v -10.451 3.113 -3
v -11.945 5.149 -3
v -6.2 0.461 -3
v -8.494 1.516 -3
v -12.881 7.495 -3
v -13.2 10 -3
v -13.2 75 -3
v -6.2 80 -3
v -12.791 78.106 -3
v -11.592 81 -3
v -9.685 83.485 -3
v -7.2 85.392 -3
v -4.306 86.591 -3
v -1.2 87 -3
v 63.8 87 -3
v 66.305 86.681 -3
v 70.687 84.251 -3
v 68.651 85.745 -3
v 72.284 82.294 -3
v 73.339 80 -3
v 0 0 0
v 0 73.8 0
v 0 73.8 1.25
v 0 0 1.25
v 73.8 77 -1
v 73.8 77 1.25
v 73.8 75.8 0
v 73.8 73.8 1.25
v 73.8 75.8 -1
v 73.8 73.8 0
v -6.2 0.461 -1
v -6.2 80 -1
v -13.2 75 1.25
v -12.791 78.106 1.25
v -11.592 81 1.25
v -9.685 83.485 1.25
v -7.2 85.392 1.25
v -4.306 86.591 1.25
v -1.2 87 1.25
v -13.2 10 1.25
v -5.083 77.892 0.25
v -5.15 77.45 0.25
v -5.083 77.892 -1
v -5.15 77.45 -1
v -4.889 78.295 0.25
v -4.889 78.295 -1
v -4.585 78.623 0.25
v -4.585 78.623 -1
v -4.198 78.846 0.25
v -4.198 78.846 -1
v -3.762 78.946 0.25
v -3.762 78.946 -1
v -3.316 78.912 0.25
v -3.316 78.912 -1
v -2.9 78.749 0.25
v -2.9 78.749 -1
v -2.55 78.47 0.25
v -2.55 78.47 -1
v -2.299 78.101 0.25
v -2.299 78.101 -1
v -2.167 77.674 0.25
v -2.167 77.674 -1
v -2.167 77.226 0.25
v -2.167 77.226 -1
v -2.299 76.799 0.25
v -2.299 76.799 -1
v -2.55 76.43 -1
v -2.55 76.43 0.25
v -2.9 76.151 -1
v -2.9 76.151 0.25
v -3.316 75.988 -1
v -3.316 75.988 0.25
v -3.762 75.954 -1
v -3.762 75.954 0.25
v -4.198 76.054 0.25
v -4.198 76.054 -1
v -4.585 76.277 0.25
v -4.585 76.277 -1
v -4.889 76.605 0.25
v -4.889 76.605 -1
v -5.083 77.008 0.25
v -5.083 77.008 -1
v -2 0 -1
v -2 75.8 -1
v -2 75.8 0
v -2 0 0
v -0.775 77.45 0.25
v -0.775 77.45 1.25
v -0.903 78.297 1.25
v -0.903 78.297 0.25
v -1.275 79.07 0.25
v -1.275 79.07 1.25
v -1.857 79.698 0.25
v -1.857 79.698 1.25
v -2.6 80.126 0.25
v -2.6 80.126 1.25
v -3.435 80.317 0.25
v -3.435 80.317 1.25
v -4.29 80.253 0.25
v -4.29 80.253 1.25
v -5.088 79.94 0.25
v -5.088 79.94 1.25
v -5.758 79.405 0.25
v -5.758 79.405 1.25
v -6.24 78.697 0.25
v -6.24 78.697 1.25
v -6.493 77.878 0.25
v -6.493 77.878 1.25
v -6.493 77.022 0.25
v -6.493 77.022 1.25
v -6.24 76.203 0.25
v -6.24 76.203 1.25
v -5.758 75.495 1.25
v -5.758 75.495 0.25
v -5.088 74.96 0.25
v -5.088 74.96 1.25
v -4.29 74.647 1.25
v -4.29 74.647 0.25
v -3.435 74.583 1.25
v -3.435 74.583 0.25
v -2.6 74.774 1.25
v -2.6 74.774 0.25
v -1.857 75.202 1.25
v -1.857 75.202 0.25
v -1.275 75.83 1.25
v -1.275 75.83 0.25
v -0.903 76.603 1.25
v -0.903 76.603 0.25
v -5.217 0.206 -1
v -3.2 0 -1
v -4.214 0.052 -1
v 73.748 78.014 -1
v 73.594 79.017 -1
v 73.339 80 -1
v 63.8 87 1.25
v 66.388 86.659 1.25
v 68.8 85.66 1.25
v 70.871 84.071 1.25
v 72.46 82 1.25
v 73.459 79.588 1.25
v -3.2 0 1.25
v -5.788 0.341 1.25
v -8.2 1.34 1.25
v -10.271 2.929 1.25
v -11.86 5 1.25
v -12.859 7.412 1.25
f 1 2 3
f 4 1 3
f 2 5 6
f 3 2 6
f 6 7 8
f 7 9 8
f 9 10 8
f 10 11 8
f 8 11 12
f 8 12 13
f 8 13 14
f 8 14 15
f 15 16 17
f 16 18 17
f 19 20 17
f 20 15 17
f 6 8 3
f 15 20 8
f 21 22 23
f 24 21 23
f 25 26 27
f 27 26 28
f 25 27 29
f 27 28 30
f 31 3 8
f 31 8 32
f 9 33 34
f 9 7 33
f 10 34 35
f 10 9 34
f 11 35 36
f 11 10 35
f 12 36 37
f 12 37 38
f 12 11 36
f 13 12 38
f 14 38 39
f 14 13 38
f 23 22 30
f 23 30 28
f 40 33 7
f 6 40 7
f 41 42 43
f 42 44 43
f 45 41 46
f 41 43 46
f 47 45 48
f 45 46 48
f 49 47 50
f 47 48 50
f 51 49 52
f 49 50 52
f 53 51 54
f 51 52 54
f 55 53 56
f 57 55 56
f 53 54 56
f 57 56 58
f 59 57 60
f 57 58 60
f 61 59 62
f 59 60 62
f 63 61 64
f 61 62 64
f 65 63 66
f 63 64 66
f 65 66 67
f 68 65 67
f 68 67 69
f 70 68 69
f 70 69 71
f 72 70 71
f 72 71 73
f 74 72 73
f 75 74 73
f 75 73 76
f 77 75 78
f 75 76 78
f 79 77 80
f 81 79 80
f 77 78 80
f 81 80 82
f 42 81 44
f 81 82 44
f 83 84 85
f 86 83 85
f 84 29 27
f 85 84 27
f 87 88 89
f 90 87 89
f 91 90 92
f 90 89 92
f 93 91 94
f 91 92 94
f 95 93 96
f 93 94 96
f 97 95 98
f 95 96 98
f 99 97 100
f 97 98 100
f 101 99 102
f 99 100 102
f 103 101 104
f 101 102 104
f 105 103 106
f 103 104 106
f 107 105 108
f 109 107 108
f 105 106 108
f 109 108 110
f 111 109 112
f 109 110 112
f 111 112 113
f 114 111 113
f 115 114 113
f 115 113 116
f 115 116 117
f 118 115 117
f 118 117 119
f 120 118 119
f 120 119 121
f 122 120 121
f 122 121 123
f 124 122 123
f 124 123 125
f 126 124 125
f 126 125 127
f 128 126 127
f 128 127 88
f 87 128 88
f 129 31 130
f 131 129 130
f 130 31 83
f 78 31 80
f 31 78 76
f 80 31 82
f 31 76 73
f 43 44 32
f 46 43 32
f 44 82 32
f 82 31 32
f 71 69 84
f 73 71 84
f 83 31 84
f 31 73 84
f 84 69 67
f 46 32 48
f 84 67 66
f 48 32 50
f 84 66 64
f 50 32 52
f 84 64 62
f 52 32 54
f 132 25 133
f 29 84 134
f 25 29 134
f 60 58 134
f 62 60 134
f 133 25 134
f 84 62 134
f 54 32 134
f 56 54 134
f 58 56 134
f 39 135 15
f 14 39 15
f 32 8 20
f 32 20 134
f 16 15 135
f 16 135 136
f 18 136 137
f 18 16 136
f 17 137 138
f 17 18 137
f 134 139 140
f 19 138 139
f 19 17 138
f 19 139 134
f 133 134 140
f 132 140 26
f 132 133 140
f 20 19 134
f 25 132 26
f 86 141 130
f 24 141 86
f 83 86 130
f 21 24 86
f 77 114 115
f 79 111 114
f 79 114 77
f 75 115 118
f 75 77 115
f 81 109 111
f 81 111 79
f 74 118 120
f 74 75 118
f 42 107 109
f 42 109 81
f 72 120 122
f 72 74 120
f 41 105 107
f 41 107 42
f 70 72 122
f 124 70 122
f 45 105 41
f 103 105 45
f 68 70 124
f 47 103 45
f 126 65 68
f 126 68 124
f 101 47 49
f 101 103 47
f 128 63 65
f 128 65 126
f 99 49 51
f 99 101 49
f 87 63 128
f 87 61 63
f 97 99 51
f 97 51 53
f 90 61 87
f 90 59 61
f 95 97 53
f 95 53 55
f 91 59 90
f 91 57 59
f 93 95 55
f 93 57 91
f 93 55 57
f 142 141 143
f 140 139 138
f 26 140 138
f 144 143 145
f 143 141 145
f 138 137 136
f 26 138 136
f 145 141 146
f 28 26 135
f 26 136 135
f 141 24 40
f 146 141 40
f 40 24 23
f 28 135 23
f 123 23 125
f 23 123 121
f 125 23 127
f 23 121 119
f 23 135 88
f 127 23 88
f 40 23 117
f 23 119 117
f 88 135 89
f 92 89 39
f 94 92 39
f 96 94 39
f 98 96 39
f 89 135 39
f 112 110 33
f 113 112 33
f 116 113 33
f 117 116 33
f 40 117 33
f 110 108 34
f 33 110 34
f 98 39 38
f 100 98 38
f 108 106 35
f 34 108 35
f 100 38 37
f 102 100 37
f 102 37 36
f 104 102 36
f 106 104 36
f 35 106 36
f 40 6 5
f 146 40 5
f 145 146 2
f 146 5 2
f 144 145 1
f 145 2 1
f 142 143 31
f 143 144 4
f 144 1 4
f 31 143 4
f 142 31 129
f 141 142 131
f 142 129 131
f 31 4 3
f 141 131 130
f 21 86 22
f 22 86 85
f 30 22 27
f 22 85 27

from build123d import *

# Parameters (mm, degrees)
F3_R           = 10
F4_R           = 12
F6_D           = 3
F6_CBORE_D     = 5.75
F6_CBORE_DEPTH = 1


with BuildPart() as f2:
    # F2: sweep along a path in F1
    with BuildLine(Plane.XY) as f2_path:
        Line((-6.2, 0), (-6.2, 80))
        Line((-6.2, 80), (73.8, 80))
    # F0 (on Front) → F2 (sweep)
    with BuildSketch(Plane.XZ):
        Polygon((-6.2, -3), (-6.2, -1), (-2, -1), (-2, 0), (0, 0), (0, 1.25), (-13.2, 1.25), (-13.2, -3), align=None)
    sweep(path=f2_path.line, transition=Transition.RIGHT)

    # F3
    f3_edges = [f2.edges().sort_by_distance(p)[0] for p in [
        (-13.2, 0, -0.875),
        (73.8, 87, -0.875),
    ]]
    fillet(f3_edges, radius=F3_R)

    # F4
    f4_edges = [f2.edges().sort_by_distance(p)[0] for p in [
        (-13.2, 87, -0.875),
    ]]
    fillet(f4_edges, radius=F4_R)

    # F6 (through all)
    with Locations(Plane.XY.offset(1.25)):
        with Locations((-3.65, 77.45)):
            CounterBoreHole(F6_D / 2, F6_CBORE_D / 2, F6_CBORE_DEPTH)


solid = f2.part
